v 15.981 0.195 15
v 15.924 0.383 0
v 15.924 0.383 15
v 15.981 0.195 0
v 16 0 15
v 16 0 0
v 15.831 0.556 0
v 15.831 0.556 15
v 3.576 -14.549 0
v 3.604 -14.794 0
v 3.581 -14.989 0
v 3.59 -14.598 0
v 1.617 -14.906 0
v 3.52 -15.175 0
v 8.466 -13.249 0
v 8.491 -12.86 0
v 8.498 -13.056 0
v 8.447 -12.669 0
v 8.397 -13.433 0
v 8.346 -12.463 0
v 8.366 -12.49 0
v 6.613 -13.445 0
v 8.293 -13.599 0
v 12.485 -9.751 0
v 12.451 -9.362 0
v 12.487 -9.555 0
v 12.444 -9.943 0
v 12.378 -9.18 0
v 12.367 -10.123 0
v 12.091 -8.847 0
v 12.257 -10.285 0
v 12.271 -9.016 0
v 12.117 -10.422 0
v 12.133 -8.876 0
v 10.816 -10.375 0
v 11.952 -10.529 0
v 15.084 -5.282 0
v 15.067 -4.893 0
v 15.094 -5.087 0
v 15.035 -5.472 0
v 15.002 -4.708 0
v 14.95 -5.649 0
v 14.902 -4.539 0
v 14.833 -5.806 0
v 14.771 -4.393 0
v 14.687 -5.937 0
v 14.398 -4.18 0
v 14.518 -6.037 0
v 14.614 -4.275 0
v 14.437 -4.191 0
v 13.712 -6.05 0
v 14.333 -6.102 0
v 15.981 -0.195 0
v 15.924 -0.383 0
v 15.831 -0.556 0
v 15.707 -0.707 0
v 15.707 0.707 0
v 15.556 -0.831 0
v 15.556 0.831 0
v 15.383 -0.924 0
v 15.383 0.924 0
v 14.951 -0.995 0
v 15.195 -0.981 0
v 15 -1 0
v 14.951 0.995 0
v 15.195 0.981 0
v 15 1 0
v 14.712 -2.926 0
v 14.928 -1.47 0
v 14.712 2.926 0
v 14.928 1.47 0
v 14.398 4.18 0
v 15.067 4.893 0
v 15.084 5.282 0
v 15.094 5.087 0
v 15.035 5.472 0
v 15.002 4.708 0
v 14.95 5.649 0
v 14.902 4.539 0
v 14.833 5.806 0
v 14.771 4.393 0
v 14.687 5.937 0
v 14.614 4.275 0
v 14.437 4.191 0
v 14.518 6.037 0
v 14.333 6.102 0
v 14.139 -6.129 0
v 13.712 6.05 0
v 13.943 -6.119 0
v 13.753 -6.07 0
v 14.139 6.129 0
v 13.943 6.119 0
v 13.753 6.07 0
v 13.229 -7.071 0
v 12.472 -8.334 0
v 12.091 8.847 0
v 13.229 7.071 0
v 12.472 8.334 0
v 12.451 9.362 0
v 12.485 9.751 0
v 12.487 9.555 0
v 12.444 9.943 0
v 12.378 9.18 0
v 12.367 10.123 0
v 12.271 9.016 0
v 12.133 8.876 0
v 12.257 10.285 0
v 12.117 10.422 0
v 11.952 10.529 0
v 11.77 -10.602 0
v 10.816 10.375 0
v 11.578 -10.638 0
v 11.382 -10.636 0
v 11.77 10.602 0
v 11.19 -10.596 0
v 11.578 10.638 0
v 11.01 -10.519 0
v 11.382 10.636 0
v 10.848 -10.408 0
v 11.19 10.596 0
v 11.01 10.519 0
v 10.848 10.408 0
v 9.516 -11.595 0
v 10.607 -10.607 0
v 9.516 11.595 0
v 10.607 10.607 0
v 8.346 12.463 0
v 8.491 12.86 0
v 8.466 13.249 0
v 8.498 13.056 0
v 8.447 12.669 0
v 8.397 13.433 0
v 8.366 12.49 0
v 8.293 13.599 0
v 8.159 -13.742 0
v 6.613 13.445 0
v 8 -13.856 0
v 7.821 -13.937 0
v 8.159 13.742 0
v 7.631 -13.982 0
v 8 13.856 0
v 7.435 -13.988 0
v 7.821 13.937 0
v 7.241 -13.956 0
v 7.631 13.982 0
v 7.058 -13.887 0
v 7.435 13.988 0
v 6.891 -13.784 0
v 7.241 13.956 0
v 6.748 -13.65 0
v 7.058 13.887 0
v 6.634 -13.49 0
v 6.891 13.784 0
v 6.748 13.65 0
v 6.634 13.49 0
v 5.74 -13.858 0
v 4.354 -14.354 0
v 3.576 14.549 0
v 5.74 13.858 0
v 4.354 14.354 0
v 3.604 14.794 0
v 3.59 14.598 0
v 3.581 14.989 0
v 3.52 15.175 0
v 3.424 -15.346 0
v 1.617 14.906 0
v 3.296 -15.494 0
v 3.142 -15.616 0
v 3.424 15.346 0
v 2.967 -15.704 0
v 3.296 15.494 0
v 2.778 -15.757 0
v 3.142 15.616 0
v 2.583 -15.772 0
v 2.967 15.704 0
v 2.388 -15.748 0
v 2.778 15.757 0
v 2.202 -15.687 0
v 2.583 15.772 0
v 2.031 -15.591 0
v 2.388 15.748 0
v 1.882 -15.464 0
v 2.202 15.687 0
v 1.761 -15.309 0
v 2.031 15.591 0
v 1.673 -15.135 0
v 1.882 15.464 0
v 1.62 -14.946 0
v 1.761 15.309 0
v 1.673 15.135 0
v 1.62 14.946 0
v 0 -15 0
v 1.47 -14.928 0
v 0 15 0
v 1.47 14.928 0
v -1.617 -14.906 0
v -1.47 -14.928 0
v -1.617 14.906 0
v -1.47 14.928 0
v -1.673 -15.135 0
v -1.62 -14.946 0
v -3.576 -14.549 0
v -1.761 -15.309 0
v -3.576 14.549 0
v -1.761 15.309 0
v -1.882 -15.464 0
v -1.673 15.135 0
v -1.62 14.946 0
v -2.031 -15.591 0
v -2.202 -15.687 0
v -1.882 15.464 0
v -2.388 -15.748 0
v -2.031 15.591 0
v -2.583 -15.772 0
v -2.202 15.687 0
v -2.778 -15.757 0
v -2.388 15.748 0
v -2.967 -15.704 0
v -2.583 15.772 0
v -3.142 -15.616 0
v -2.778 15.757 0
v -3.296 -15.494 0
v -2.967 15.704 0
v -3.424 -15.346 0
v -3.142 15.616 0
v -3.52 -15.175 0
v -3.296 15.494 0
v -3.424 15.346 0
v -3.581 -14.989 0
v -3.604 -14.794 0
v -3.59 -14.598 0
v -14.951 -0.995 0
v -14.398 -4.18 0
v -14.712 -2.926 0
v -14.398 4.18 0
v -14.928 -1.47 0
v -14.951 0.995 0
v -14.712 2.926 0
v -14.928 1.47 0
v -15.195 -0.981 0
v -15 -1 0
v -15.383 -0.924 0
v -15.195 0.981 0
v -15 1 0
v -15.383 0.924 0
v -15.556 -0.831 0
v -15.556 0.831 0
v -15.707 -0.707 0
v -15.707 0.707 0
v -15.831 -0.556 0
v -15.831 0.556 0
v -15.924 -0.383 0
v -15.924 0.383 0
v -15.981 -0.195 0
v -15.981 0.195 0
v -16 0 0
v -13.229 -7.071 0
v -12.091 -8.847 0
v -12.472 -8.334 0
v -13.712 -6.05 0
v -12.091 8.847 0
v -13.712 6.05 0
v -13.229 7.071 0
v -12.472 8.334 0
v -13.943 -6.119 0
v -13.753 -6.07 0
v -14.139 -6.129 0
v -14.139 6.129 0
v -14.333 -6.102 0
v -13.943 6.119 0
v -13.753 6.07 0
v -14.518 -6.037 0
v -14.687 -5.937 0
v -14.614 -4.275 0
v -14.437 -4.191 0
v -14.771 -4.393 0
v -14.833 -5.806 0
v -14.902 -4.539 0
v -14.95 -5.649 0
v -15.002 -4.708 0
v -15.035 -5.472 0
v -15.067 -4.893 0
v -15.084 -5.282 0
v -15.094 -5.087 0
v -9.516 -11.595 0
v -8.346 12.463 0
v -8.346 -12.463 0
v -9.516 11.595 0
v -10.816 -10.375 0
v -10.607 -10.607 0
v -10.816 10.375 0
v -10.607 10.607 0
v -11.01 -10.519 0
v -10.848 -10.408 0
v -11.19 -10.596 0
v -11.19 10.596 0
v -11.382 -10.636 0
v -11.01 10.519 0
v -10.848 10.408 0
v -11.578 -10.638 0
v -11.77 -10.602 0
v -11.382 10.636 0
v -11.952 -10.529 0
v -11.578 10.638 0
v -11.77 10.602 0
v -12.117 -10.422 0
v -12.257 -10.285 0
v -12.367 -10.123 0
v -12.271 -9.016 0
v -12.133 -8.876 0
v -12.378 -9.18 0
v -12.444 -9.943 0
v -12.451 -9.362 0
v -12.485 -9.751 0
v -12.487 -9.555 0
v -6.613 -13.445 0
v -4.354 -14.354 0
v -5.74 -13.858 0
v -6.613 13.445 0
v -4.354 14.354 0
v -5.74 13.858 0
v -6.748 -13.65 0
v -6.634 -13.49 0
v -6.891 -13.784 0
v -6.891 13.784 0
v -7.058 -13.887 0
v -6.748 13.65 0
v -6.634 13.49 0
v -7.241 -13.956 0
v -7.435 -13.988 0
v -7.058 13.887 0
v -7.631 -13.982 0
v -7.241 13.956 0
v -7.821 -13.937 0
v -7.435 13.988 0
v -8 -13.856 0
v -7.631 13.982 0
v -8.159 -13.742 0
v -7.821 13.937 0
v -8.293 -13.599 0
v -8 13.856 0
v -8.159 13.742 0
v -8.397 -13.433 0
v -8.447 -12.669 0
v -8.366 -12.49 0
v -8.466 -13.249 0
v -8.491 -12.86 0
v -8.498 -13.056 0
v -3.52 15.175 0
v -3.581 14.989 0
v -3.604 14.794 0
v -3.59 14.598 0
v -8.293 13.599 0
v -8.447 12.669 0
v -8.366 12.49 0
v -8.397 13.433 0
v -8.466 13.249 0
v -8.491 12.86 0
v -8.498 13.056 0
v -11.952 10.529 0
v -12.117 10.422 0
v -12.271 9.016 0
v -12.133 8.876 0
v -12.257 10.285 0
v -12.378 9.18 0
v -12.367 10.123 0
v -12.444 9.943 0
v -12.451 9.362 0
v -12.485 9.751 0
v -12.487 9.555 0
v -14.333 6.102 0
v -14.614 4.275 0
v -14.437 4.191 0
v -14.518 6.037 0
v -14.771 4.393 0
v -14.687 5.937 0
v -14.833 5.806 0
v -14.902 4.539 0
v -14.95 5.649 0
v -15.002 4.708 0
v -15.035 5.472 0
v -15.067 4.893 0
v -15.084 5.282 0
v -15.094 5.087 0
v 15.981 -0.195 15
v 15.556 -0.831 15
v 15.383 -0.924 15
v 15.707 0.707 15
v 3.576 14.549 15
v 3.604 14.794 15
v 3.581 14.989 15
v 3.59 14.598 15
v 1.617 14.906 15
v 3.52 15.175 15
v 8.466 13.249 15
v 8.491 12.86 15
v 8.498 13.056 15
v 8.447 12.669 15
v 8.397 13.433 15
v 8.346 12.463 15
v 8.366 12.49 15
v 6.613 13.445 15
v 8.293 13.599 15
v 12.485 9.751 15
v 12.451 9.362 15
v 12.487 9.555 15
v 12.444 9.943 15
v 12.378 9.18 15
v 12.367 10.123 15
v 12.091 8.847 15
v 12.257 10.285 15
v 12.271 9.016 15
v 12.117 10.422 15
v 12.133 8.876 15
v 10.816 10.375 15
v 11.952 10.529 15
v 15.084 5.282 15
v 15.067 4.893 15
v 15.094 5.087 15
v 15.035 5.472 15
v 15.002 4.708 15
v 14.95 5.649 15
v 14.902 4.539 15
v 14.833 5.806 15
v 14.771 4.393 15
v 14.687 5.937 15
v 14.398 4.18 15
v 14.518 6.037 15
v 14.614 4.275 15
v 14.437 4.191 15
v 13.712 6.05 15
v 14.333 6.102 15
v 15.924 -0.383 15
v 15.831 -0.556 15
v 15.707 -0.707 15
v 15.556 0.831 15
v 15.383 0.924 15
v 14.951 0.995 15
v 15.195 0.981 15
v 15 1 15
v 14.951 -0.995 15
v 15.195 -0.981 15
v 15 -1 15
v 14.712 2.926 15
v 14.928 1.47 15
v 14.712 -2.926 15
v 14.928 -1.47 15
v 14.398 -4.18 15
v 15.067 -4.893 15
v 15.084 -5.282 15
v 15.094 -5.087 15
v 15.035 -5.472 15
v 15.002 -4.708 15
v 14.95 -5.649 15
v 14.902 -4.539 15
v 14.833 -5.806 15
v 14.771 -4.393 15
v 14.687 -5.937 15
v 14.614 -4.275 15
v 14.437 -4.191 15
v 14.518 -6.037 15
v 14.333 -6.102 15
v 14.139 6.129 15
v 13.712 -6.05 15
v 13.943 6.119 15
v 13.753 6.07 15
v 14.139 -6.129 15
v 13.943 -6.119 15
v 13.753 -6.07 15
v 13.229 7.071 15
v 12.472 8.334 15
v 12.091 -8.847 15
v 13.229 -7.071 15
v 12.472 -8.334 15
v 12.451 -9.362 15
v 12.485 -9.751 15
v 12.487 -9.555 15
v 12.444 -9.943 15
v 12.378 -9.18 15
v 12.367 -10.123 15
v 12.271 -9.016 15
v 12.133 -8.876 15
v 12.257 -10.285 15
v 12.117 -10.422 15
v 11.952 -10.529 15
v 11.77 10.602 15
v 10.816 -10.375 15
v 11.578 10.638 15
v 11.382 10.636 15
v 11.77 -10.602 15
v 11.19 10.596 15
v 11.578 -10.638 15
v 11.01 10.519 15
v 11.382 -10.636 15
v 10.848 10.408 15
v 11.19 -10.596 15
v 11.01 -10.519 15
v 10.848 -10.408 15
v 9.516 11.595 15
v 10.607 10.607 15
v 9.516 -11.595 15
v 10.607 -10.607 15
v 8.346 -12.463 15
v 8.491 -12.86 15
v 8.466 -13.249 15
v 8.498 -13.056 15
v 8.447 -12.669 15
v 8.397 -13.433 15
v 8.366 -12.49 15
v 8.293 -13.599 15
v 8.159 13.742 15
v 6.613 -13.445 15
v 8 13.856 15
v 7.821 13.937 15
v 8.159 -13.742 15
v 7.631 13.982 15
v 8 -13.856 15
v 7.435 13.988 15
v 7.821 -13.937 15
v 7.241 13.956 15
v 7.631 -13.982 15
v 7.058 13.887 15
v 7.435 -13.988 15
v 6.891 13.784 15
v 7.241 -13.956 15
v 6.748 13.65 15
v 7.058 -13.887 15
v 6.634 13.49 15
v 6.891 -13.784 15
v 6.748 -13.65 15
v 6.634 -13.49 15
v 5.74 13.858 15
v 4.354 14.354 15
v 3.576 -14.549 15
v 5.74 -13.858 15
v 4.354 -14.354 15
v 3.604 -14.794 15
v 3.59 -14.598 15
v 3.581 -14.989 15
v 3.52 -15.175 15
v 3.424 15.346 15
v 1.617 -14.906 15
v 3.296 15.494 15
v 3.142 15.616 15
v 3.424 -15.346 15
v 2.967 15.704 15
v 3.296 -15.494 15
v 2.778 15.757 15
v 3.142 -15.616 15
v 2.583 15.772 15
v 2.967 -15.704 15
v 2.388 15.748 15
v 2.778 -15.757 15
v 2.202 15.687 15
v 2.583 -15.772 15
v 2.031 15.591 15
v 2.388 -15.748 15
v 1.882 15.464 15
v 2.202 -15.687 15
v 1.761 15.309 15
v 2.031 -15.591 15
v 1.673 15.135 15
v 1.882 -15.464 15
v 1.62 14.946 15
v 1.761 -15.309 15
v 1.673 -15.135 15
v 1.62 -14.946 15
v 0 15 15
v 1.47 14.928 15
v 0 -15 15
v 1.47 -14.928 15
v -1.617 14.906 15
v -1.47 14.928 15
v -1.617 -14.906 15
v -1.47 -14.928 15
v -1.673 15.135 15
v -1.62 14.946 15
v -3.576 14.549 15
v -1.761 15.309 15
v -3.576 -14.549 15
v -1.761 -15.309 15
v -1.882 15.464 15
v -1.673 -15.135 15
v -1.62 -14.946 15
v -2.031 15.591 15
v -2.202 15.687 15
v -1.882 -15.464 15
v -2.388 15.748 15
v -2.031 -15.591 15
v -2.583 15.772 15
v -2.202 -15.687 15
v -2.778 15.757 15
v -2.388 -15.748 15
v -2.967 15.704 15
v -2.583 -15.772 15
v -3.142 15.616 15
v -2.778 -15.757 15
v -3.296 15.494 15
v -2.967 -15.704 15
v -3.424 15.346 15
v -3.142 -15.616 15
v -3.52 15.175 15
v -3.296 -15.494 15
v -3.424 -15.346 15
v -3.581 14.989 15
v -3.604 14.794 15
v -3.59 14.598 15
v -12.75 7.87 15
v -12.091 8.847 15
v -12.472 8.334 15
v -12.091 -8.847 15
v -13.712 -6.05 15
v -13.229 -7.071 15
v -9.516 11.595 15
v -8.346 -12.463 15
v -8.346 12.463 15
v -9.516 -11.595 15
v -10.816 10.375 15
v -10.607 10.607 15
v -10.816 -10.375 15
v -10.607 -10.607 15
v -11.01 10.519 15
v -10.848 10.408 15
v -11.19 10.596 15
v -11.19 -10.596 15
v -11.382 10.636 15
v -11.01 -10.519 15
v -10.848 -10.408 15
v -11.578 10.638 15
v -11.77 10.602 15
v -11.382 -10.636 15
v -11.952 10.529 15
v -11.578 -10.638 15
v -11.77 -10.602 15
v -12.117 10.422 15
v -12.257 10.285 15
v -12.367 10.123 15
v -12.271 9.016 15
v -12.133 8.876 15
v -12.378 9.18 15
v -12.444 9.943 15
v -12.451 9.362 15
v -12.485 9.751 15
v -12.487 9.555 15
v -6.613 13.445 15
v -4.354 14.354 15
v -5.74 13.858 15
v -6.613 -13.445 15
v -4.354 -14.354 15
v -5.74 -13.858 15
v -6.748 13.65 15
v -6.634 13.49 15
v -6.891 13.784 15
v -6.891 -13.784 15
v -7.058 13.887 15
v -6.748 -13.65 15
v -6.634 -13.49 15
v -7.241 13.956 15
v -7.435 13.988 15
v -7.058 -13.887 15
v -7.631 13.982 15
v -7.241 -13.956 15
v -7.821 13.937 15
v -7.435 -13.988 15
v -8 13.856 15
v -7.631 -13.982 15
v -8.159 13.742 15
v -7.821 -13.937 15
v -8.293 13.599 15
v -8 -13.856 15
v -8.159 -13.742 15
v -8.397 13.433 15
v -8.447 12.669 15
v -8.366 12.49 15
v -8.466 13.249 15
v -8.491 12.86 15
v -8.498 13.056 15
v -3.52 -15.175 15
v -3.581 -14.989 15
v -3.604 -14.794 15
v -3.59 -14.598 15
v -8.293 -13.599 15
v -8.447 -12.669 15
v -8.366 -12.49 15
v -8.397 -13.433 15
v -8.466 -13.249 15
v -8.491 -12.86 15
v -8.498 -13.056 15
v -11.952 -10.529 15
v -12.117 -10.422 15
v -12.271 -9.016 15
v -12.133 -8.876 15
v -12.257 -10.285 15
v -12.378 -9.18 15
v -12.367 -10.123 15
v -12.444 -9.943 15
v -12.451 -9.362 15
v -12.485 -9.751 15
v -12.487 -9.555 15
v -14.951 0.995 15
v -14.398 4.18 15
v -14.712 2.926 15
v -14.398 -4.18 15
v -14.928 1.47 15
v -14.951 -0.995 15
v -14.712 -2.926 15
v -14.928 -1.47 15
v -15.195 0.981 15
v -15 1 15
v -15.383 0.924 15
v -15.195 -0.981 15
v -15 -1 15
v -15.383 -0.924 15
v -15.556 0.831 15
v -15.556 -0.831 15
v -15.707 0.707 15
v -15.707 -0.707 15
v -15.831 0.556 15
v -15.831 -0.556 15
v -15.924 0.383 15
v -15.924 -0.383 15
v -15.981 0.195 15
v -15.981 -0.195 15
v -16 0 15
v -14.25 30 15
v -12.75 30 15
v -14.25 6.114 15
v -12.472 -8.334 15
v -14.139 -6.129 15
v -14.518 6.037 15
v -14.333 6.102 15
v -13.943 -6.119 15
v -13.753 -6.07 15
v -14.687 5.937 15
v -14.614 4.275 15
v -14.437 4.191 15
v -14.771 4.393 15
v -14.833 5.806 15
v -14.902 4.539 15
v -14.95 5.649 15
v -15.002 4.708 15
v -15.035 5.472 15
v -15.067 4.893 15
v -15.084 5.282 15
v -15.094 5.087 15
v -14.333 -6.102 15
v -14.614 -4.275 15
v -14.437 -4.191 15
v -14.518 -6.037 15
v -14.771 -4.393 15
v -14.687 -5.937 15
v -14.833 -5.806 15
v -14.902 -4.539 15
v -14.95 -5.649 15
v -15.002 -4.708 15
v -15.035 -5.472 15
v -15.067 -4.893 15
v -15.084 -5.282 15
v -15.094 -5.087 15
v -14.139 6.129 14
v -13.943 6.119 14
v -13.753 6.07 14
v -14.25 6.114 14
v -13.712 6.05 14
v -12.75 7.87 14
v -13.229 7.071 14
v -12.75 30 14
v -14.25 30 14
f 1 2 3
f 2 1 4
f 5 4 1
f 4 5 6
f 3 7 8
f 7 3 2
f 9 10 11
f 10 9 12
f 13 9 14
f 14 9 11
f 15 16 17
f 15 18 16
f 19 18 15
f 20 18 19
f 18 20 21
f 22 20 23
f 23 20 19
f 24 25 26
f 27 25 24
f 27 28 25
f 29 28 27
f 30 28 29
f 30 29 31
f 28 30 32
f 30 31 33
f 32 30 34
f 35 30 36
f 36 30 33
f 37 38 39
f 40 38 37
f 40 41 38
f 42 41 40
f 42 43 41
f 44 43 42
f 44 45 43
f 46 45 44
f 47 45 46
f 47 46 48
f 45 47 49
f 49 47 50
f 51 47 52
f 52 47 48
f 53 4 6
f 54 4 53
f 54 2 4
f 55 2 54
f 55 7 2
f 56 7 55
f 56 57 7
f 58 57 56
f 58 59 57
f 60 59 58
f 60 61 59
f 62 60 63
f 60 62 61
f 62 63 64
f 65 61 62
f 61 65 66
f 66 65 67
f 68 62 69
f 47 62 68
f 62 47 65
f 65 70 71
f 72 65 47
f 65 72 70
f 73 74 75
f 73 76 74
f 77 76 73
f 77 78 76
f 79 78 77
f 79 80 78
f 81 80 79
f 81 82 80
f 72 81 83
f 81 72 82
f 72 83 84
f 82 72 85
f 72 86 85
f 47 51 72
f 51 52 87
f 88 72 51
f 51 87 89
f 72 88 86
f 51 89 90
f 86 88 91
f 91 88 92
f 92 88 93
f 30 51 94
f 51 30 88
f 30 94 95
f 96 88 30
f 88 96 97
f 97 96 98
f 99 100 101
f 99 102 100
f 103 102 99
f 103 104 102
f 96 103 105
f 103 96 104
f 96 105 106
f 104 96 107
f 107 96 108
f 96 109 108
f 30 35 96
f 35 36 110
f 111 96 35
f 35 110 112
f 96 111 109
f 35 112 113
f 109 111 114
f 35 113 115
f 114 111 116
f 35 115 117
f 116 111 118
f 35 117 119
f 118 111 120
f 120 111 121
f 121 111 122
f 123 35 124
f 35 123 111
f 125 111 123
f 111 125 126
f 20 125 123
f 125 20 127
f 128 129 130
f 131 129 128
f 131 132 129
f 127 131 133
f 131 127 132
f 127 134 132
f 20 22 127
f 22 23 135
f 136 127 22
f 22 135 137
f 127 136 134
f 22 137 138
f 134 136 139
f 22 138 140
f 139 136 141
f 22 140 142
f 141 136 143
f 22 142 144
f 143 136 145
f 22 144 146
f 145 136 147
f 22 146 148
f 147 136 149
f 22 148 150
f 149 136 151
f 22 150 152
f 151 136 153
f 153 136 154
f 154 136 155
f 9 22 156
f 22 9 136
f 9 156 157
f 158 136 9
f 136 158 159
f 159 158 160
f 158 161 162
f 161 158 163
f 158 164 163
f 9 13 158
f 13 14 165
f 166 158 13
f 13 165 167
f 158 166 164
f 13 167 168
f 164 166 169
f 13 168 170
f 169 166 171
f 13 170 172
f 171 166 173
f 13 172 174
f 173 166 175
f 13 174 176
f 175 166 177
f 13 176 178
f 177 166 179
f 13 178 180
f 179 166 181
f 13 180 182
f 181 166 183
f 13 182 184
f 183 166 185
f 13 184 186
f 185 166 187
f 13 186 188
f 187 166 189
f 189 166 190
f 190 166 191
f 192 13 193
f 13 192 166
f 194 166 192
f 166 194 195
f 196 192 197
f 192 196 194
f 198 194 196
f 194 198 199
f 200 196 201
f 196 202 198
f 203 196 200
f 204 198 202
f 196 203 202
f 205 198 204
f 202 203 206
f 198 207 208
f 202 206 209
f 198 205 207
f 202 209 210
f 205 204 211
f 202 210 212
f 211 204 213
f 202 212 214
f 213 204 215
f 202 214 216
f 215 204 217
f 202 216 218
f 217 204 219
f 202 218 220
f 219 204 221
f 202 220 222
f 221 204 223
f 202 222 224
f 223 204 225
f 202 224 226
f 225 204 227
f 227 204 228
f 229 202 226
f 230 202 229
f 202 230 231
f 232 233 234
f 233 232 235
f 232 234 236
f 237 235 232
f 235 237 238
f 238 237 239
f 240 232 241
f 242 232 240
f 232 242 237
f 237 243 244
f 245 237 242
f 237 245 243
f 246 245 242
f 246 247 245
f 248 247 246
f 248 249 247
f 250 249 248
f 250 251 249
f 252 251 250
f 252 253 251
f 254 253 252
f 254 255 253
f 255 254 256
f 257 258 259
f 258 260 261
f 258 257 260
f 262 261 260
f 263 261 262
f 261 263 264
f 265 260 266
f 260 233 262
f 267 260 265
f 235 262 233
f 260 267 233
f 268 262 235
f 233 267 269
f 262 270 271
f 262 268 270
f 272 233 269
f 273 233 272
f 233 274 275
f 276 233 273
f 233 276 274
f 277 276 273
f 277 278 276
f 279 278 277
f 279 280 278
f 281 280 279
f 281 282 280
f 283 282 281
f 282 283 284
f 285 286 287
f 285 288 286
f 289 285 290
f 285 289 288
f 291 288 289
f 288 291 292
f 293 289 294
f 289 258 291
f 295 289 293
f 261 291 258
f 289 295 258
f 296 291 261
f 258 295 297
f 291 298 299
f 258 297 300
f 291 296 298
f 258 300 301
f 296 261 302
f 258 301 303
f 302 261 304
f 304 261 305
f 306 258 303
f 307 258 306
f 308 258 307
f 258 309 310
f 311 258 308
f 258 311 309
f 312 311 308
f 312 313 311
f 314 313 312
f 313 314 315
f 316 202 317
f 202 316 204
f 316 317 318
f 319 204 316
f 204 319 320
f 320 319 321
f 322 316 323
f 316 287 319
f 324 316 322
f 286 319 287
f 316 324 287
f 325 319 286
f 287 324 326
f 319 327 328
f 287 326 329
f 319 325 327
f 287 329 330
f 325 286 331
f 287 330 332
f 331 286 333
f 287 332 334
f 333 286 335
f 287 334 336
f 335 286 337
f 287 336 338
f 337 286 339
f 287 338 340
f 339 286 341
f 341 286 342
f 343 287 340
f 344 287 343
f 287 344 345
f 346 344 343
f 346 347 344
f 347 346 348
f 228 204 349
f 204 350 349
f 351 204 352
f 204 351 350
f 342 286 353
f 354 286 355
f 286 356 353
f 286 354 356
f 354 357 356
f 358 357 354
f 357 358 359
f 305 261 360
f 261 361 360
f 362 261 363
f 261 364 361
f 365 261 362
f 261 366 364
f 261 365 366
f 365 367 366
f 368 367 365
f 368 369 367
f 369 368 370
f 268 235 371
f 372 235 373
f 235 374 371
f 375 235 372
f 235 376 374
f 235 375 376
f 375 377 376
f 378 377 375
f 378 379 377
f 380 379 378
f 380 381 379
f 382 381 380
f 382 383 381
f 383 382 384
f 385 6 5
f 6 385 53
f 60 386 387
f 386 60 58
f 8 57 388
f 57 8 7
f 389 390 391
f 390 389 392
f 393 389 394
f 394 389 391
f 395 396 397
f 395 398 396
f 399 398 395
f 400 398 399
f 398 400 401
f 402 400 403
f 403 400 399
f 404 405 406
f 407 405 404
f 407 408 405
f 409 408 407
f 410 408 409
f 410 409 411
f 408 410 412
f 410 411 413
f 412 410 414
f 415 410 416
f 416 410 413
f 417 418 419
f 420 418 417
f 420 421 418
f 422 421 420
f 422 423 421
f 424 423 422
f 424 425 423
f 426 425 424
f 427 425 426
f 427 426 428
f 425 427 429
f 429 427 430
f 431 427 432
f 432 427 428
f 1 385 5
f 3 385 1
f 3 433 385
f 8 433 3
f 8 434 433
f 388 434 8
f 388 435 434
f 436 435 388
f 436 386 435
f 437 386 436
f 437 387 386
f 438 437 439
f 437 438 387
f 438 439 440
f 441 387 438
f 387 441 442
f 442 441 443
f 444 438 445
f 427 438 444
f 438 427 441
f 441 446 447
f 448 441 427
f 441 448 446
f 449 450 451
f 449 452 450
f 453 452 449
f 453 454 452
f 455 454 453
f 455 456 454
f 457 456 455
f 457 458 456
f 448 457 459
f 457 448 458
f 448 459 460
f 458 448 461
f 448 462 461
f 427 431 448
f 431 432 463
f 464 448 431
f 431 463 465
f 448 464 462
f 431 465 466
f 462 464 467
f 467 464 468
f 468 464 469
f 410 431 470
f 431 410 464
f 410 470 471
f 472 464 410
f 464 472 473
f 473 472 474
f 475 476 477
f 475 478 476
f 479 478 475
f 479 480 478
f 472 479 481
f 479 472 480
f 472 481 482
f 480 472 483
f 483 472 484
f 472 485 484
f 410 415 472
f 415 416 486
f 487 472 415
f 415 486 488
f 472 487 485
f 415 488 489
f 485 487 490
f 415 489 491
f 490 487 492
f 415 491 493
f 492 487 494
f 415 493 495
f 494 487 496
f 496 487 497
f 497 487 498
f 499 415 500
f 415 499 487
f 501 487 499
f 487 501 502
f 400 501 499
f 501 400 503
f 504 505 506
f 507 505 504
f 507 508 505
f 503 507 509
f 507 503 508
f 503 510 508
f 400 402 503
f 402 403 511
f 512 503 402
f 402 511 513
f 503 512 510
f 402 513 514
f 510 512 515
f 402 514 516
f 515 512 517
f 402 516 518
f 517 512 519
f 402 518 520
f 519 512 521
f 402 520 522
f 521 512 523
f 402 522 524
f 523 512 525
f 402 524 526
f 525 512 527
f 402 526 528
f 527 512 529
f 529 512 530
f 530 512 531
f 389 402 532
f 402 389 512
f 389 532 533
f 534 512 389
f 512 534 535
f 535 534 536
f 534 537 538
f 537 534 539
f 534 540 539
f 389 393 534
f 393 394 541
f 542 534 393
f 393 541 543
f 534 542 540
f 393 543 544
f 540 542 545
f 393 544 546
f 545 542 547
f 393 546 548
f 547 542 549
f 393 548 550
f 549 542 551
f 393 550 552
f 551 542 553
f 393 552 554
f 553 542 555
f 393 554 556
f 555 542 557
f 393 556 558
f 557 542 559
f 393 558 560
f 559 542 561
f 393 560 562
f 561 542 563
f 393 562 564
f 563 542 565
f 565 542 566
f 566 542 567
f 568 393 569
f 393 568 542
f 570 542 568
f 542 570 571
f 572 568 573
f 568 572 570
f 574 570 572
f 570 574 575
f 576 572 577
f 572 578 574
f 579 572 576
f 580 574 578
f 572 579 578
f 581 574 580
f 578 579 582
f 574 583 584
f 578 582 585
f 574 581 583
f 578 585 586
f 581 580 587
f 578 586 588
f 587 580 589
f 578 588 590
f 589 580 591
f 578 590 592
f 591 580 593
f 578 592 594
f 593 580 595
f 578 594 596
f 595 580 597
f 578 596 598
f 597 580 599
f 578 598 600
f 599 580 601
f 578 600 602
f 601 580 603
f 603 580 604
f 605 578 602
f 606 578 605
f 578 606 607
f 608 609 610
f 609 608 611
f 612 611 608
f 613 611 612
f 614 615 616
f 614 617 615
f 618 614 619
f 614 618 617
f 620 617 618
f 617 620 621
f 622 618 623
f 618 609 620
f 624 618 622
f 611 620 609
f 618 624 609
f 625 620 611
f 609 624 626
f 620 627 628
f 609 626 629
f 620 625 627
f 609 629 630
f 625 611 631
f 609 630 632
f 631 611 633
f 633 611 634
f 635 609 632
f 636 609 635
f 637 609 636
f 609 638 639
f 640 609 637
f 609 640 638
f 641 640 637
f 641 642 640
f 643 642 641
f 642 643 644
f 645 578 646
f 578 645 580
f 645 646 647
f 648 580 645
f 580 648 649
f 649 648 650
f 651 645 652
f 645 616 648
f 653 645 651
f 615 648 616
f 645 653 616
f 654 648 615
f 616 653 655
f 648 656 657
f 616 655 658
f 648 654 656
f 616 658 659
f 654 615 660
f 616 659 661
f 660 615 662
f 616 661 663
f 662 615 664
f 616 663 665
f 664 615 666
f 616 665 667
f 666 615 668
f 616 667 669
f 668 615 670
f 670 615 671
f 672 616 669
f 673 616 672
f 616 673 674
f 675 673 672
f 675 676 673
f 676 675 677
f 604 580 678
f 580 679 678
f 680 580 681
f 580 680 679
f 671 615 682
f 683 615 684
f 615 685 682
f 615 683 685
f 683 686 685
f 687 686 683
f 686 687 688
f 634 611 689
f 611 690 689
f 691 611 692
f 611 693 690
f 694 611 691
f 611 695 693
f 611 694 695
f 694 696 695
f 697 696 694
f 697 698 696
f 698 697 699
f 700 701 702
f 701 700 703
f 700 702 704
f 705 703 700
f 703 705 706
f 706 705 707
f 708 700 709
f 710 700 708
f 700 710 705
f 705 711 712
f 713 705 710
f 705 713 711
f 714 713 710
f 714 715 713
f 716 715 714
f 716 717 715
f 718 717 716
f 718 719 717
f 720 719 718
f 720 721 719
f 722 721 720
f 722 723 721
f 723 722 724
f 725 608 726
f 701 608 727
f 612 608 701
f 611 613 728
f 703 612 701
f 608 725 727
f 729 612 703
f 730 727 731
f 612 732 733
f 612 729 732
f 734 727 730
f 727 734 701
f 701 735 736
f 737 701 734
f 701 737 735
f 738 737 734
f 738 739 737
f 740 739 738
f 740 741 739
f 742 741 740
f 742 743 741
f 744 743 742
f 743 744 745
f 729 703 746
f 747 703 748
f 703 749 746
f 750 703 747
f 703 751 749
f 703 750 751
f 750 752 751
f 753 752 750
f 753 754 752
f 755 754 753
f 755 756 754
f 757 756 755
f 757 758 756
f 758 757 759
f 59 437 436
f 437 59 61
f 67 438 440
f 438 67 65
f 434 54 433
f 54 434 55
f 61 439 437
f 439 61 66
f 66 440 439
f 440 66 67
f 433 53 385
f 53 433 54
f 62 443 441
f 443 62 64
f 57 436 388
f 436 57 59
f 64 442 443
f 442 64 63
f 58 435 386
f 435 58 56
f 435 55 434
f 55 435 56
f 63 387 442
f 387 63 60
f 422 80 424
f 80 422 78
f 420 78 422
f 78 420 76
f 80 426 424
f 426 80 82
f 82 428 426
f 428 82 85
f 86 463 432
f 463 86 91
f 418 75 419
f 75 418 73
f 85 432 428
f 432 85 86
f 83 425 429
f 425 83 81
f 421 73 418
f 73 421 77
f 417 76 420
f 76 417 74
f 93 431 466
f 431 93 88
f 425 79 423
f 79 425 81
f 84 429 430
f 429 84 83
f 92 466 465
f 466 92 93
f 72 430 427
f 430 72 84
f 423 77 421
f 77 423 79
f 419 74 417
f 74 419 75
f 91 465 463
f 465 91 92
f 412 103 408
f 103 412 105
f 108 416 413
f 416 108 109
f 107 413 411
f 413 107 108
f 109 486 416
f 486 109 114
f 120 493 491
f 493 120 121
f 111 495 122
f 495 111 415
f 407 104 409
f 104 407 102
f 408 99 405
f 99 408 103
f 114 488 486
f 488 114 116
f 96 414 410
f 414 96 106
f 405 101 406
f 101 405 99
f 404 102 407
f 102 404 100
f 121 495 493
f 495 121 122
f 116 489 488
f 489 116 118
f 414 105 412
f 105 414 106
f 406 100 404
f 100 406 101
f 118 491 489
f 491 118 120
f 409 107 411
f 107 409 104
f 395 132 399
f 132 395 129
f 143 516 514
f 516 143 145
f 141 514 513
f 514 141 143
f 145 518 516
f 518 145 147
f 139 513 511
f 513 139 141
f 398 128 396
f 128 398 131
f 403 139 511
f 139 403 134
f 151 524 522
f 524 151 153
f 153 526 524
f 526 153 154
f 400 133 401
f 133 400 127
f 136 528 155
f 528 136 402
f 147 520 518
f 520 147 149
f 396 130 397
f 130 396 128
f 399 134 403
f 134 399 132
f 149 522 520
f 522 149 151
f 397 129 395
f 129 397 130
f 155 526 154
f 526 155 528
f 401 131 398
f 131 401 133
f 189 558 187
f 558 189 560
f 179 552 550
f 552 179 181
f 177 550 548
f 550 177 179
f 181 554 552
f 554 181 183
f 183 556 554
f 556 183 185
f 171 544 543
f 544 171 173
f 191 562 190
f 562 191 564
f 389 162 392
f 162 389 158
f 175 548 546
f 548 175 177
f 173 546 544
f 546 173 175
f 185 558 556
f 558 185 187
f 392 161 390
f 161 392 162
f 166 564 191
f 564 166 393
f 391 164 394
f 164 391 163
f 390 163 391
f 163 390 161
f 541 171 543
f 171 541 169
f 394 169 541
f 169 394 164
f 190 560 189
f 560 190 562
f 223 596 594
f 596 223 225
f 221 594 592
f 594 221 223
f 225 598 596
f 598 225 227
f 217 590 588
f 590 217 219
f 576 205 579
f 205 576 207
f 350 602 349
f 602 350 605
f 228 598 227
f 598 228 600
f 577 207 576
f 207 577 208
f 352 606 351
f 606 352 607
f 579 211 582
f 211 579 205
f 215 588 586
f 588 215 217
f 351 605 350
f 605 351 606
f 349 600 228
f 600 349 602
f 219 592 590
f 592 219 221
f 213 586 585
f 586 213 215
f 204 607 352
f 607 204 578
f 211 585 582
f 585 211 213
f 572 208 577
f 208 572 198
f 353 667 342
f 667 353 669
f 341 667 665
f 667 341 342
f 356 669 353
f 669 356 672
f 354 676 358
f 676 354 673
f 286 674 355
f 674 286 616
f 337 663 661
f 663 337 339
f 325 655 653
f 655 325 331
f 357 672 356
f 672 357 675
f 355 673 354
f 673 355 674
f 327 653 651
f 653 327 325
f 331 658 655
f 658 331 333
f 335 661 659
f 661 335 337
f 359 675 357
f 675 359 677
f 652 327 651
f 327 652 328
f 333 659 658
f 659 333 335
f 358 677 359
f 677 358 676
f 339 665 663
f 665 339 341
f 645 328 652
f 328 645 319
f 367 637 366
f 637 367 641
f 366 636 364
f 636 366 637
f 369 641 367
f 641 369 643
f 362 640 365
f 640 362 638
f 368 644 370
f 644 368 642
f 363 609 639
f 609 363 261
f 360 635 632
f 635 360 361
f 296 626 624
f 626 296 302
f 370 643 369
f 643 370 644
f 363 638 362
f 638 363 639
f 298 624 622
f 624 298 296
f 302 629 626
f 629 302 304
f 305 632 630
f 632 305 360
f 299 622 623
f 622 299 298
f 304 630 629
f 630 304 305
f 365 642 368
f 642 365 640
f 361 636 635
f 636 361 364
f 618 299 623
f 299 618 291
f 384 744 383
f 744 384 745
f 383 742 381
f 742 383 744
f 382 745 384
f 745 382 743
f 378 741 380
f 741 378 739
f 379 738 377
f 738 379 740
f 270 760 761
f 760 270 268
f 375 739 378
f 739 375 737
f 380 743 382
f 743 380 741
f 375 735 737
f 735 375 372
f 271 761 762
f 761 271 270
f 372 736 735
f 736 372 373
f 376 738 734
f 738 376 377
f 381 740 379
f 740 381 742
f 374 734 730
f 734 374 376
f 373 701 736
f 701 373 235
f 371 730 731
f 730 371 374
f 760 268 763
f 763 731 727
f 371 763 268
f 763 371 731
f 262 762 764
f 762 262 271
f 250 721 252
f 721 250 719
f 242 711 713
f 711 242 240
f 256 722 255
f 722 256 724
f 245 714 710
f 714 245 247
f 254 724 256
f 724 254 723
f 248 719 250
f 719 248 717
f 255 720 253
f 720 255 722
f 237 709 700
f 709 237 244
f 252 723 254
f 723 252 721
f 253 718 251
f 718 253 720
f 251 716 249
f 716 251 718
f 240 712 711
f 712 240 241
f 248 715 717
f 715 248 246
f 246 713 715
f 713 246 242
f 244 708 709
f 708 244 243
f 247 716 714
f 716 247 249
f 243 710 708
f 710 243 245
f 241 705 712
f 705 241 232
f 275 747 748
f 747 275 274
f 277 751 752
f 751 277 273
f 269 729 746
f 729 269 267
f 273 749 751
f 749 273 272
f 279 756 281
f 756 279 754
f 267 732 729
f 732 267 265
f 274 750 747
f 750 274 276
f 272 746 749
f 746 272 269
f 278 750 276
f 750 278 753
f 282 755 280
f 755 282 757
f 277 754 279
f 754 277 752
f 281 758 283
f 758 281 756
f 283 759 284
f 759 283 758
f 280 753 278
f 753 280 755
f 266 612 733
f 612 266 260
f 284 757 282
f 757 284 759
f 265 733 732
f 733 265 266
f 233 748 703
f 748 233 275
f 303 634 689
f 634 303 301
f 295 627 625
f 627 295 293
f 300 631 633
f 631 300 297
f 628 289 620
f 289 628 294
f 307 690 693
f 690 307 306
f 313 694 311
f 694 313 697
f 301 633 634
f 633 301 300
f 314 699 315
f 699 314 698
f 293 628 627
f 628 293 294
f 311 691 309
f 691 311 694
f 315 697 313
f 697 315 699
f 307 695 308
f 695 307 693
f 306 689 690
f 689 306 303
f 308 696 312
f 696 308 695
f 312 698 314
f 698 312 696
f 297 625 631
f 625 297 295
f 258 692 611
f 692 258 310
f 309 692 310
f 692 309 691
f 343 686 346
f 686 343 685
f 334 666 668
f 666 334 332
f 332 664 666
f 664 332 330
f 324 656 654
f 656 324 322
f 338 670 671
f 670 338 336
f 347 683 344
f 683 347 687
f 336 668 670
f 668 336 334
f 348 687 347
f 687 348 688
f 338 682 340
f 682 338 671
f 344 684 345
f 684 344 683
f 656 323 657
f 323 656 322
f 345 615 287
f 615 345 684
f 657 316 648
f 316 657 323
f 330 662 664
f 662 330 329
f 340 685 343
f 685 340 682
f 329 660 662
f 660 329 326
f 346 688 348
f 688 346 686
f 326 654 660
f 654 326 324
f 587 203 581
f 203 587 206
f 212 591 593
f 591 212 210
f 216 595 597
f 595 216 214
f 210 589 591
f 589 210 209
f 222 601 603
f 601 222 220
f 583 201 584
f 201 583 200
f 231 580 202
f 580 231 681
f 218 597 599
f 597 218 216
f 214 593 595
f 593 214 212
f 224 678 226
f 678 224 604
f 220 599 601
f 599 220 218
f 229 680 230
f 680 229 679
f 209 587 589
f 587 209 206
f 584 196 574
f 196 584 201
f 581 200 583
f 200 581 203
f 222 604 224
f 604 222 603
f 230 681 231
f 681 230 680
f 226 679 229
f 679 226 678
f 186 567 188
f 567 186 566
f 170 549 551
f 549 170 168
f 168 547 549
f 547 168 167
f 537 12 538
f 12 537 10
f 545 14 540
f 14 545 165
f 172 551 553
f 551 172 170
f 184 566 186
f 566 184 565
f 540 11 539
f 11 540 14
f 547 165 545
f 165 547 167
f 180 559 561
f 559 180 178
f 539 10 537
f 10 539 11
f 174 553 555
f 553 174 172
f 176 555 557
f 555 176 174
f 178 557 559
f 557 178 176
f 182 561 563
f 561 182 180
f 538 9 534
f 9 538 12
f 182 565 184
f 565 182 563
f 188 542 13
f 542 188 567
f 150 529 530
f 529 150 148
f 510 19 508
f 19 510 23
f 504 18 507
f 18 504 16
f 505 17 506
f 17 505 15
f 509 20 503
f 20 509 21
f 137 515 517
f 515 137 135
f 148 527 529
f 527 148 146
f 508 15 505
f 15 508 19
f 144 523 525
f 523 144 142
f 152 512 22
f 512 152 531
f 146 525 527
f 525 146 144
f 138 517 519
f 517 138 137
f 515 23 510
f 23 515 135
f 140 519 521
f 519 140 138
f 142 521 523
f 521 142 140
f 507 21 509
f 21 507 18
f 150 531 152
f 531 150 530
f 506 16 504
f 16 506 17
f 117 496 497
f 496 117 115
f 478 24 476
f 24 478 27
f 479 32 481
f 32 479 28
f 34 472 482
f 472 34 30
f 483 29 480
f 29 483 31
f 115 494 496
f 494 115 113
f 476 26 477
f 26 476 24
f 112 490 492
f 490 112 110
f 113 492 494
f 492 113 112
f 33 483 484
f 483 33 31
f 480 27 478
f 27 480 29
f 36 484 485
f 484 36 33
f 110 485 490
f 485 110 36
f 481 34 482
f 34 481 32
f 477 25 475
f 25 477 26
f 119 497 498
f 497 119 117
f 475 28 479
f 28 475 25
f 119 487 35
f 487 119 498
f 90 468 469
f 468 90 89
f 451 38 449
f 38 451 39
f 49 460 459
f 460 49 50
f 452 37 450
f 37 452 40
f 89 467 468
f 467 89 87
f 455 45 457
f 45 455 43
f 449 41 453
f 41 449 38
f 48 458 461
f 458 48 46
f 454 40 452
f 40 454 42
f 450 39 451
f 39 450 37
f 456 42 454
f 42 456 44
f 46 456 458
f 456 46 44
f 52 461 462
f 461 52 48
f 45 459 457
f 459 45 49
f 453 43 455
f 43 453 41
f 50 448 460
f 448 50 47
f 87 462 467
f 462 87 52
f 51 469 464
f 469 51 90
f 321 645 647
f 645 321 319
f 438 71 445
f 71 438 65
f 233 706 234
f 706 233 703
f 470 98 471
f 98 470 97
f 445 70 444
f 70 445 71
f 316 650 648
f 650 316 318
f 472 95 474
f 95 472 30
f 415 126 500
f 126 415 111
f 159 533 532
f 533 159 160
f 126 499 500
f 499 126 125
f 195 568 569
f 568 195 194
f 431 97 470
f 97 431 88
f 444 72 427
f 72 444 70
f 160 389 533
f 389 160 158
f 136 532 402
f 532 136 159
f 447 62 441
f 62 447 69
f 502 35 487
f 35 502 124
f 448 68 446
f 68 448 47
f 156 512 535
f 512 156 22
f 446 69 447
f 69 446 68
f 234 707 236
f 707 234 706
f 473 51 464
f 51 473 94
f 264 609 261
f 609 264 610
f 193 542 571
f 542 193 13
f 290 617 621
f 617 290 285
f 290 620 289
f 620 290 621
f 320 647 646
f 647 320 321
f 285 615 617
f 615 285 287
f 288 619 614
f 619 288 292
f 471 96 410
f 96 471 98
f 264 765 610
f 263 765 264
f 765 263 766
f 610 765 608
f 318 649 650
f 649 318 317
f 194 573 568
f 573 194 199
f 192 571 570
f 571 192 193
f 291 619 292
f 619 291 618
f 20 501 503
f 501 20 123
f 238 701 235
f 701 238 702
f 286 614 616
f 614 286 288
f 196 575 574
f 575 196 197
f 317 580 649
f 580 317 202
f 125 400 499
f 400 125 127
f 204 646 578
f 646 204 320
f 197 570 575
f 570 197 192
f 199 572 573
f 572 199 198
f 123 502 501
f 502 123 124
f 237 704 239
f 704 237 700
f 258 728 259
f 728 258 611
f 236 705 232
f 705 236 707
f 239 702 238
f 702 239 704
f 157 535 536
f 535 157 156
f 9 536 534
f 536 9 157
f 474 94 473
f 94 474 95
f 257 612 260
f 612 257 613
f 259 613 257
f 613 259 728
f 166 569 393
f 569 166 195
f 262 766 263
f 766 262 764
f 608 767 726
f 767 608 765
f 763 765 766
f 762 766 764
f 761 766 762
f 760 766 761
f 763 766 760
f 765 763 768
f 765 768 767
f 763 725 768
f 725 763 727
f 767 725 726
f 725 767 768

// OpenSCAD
// Dimensions for the Hotplate Stirrer Knob
knob_diameter = 30;      // Overall diameter of the knob
knob_height = 15;        // Height of the knob
shaft_diameter = 6.2;    // Diameter of the D-shaft bore
shaft_flat_width = 4.7;  // Width of the flat side of the D-shaft bore
bore_depth = 12;         // Depth of the D-shaped blind bore
groove_count = 18;       // Number of vertical grip grooves
groove_diameter = 2;     // Diameter of the grip grooves
pointer_width = 1.5;     // Width of the pointer groove
pointer_depth = 1;       // Depth of the pointer groove
$fn = 64;                // Resolution for curved surfaces

// Calculate geometry
groove_radius = knob_diameter / 2;
groove_spacing = 360 / groove_count;

module grip_groove() {
    // Create a half-cylinder (semicircle) extruded along Z
    // Centered on the outer surface
    translate([groove_radius, 0, 0])
        cylinder(h = knob_height, r = groove_diameter / 2, $fn = 32);
}

module pointer_groove() {
    // Create a rectangular slot extruded along Z
    // Centered on the top face, running from center to edge
    // Positioned on the same side as the shaft flat (negative X)
    translate([-knob_diameter / 2 + pointer_width / 2, 0, knob_height - pointer_depth])
        cube([pointer_width, knob_diameter, pointer_depth]);
}

module shaft_bore() {
    // Create the D-shaped blind bore
    // The flat is on the left (negative X), so the radius is on the right
    // We use a cylinder with a rectangular cutout to create the D shape
    
    // 1. The main cylinder
    cylinder(h = bore_depth, r = shaft_diameter / 2, $fn = 64);
    
    // 2. The flat cut
    // We cut a rectangular prism that is slightly wider than the flat width
    // and extends past the cylinder to ensure clean cutting
    translate([-shaft_diameter / 2, -shaft_diameter / 2, 0])
        cube([shaft_diameter, shaft_diameter + 0.1, bore_depth + 0.1]);
}

// Main Assembly
union() {
    // 1. Base Knob
    cylinder(h = knob_height, r = groove_radius, $fn = 64);
    
    // 2. Grip Grooves
    // Loop 18 times around the circle
    for (i = [0 : groove_count - 1]) {
        rotate([0, 0, i * groove_spacing])
            grip_groove();
    }
    
    // 3. Shaft Bore
    // Cut the D-shaped hole from the bottom
    translate([0, 0, 0])
        shaft_bore();
        
    // 4. Pointer Groove
    // Cut the pointer slot from the top
    pointer_groove();
}
